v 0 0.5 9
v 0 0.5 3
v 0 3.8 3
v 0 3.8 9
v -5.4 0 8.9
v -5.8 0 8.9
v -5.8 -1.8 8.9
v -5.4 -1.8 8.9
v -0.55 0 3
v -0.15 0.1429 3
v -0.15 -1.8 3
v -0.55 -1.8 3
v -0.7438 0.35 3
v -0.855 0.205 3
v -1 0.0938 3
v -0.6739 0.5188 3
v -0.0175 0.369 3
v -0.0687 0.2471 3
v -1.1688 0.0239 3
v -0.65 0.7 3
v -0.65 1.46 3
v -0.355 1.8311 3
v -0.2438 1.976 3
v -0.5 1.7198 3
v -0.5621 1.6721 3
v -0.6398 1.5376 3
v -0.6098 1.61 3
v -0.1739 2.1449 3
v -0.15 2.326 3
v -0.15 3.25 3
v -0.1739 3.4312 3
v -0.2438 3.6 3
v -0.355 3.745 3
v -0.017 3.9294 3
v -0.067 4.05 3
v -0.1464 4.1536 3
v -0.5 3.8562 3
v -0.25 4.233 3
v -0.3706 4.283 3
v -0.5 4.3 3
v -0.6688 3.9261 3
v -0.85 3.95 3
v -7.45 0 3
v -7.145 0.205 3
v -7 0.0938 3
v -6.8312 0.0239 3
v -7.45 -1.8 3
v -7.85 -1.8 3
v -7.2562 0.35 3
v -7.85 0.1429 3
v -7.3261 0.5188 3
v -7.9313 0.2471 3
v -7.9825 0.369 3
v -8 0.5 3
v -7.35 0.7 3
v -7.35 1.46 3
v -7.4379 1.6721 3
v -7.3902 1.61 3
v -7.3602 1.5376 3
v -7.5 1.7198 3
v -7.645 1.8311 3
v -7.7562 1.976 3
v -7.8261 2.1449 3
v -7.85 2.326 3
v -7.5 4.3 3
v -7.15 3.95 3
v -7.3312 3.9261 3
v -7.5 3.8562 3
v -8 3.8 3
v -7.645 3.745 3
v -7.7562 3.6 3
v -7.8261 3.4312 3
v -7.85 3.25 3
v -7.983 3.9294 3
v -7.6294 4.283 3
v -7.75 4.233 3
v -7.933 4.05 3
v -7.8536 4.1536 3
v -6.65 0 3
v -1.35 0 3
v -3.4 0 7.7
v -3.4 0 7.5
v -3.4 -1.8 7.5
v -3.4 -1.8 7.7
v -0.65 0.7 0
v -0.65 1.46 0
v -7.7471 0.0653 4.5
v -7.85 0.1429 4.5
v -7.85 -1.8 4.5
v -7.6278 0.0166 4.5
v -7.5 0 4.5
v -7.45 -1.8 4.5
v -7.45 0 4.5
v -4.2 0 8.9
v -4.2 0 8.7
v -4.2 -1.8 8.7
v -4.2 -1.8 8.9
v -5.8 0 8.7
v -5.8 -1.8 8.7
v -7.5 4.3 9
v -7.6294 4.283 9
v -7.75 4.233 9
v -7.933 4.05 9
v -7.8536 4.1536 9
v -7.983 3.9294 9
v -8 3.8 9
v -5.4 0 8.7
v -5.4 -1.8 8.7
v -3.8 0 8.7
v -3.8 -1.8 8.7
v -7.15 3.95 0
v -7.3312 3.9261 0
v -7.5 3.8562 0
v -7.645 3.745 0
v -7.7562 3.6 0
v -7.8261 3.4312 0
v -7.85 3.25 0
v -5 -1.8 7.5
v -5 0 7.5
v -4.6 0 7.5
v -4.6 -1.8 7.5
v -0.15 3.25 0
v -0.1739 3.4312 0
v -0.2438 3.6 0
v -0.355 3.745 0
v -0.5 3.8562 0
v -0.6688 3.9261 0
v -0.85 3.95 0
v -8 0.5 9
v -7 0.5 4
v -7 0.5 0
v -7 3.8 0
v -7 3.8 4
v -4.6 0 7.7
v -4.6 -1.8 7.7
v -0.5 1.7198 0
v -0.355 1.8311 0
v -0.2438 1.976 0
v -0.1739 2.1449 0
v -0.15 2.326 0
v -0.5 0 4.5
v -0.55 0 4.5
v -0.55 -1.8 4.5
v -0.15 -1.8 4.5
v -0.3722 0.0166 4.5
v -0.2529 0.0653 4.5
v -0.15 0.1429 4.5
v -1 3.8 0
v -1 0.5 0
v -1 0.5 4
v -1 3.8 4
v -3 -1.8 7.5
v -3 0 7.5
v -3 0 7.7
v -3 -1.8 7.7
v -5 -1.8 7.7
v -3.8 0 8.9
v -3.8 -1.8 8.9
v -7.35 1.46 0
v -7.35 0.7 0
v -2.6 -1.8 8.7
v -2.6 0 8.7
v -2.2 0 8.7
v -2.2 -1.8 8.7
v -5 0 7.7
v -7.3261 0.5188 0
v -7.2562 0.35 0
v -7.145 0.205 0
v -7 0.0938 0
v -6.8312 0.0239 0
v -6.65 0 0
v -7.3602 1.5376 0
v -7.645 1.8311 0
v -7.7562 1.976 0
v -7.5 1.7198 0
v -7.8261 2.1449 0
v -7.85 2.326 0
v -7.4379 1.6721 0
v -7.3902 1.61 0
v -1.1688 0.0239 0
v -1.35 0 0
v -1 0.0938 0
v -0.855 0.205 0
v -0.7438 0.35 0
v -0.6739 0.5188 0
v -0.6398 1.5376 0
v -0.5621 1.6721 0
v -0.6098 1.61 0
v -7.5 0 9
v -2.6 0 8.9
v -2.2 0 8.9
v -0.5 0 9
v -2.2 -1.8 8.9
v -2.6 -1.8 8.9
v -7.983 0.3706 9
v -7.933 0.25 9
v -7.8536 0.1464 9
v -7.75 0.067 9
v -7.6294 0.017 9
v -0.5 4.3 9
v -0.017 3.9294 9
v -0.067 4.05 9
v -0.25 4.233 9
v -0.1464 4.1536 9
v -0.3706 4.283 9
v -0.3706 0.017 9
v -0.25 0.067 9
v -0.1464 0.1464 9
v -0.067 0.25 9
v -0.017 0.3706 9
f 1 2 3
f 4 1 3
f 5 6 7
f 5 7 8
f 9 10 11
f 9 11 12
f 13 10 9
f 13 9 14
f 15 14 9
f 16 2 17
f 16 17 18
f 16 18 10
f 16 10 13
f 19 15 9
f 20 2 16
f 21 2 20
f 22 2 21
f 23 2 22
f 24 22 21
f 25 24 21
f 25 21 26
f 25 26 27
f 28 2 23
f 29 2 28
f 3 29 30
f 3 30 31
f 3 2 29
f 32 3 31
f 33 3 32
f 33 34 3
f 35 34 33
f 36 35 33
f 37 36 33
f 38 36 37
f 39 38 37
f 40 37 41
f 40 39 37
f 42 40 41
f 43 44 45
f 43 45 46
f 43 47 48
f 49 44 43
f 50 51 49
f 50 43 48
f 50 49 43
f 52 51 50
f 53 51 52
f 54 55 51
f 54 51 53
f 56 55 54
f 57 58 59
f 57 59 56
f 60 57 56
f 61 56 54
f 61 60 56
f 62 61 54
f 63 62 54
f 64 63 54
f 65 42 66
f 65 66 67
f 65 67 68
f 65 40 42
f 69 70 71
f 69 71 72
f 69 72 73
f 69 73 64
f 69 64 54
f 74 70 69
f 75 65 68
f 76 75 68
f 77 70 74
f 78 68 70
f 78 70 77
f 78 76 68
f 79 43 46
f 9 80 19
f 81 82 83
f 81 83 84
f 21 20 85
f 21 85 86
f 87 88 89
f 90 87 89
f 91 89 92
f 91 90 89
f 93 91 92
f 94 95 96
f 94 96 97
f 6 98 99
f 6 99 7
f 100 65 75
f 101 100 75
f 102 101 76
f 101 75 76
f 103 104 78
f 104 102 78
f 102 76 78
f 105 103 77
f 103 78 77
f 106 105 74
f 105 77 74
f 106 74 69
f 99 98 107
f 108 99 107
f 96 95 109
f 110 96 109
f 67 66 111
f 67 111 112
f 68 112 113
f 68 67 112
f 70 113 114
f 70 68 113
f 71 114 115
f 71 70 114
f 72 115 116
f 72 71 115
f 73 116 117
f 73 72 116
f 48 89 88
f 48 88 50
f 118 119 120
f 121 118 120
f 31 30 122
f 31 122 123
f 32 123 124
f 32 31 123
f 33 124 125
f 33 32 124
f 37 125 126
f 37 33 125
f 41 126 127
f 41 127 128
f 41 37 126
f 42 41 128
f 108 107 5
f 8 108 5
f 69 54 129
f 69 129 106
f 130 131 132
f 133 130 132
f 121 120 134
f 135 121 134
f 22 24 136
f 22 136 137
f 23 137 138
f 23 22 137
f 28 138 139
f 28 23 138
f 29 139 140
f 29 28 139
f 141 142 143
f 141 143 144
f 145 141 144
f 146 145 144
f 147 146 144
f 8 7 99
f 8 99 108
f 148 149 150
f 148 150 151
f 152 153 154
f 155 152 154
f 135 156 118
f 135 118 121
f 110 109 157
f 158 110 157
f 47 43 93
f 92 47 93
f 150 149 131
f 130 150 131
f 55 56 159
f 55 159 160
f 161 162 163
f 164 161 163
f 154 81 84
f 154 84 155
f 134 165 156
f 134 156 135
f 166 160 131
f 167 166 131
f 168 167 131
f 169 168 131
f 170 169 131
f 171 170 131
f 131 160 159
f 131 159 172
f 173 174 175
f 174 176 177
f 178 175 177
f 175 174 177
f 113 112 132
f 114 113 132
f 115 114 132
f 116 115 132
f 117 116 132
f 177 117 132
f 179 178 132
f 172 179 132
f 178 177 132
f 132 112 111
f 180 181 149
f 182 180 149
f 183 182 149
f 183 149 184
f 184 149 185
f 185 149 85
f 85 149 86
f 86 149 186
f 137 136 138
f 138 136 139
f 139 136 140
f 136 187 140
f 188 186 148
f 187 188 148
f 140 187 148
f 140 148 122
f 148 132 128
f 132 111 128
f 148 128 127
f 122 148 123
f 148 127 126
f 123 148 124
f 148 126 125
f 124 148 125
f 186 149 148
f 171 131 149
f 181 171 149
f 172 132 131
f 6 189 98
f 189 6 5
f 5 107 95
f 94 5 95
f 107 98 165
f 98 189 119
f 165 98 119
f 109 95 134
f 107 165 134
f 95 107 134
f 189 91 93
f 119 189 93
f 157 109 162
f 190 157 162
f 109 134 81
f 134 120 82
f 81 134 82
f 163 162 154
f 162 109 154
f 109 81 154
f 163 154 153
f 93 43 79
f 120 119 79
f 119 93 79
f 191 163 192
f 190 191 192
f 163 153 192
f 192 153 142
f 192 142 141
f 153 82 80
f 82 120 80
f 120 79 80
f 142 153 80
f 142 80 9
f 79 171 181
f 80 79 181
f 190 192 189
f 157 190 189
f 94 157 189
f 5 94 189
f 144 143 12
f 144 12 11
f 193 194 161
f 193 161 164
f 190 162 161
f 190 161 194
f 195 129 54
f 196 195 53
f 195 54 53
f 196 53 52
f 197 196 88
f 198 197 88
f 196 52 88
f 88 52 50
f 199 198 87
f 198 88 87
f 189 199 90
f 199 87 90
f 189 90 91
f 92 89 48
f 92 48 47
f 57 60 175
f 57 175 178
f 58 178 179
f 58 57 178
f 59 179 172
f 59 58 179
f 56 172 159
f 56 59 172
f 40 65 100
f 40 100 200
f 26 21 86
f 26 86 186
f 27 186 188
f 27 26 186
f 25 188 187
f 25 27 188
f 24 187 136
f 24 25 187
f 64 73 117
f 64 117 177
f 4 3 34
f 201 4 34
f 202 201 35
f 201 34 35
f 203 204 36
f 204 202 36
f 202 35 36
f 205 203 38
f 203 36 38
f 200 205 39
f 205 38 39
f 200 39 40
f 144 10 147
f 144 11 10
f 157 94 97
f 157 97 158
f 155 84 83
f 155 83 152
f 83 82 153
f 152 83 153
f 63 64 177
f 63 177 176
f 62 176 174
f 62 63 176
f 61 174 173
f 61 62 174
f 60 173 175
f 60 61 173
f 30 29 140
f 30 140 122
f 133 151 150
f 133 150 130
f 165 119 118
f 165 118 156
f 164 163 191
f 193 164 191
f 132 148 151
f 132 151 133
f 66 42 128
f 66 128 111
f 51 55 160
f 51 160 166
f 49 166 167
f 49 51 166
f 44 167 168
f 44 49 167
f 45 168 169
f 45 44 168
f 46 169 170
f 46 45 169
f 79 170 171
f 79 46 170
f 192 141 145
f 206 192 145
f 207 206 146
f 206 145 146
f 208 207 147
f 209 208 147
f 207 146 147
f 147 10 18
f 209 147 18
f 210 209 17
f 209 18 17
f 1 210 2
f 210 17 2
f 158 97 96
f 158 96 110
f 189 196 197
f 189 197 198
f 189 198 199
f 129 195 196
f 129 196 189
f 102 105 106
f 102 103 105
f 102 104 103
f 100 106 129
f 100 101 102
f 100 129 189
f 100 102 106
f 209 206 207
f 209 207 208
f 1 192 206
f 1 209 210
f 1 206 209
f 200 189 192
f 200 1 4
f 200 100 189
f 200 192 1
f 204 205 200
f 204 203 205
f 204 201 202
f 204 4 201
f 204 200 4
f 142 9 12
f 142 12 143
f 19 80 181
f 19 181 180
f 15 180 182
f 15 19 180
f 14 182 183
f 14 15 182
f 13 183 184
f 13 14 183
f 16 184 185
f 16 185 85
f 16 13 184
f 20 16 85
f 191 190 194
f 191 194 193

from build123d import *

# Parameters (mm, degrees)
ESQUISSE1_W             = 8
ESQUISSE1_H             = 4.3
EXTRUSION1_DEPTH        = 9
ESQUISSE2_W             = 6
ESQUISSE2_H             = 3.3
ENL_V_MAT_EXTRU_1_DEPTH = 4
ESQUISSE3_W             = 0.4
ESQUISSE3_H             = 1.5
EXTRUSION2_DEPTH        = 1.8
CONG_1_R                = 0.5
ESQUISSE4_W             = 0.4
ESQUISSE4_H             = 0.2
EXTRUSION3_DEPTH        = 1.8
ENL_V_START             = -3
ENL_V_MAT_EXTRU_3_DEPTH = 3


# Read off the part's stored shape, not the designer's step: Enlèv. mat.-Extru.3
with BuildPart() as part:
    # Esquisse1 → Extrusion1 (new body)
    with BuildSketch(Plane.XY):
        with Locations((-4, 2.15)):
            Rectangle(ESQUISSE1_W, ESQUISSE1_H)
    extrude(amount=EXTRUSION1_DEPTH)

    # Esquisse2 → Enlèv. mat.-Extru.1 (cut)
    with BuildSketch(Plane(origin=(0, 0, 0), x_dir=(-1, 0, 0), z_dir=(0, 0, -1))):
        with Locations((4, 2.15)):
            Rectangle(ESQUISSE2_W, ESQUISSE2_H)
    extrude(amount=-ENL_V_MAT_EXTRU_1_DEPTH, mode=Mode.SUBTRACT)

    # Esquisse3 → Extrusion2 (add)
    with BuildSketch(Plane.XZ):
        with Locations((-0.35, 3.75)):
            Rectangle(ESQUISSE3_W, ESQUISSE3_H)
        with Locations((-7.65, 3.75)):
            Rectangle(ESQUISSE3_W, ESQUISSE3_H)
    extrude(amount=EXTRUSION2_DEPTH)

    # Congé1
    # the kernel refuses this fillet: 0.5 mm, written as the material it takes off along each edge
    with BuildSketch(Plane(origin=(0, 0, -1.25), x_dir=(-1, 0, 0), z_dir=(0, 0, 1))) as cong_1_piece_1_section:
        with BuildLine():
            CenterArc((CONG_1_R, -CONG_1_R), CONG_1_R, 90, 90)
            Line((0, -CONG_1_R), (0, 0))
            Line((0, 0), (CONG_1_R, 0))
        make_face()
    cong_1_piece_1 = extrude(amount=11.5, mode=Mode.PRIVATE)
    cong_1_piece_1 = split(cong_1_piece_1, bisect_by=Plane(origin=(-0.251340373, 0.033035409, 3), z_dir=(0, 0, -1)), keep=Keep.TOP, mode=Mode.PRIVATE)
    cong_1_piece_1 = split(cong_1_piece_1, bisect_by=Plane(origin=(-0.15, 0.033035409, 0.875), z_dir=(-1, 0, 0)), keep=Keep.TOP, mode=Mode.PRIVATE)
    add(cong_1_piece_1, mode=Mode.SUBTRACT)
    with BuildSketch(Plane(origin=(0, 0, -1.25), x_dir=(-1, 0, 0), z_dir=(0, 0, 1))) as cong_1_piece_2_section:
        with BuildLine():
            CenterArc((CONG_1_R, -CONG_1_R), CONG_1_R, 90, 90)
            Line((0, -CONG_1_R), (0, 0))
            Line((0, 0), (CONG_1_R, 0))
        make_face()
    cong_1_piece_2 = extrude(amount=11.5, mode=Mode.PRIVATE)
    cong_1_piece_2 = split(cong_1_piece_2, bisect_by=Plane(origin=(-0.054158411, 0.147457064, 3), z_dir=(0, 0, -1)), keep=Keep.TOP, mode=Mode.PRIVATE)
    cong_1_piece_2 = split(cong_1_piece_2, bisect_by=Plane(origin=(-0.15, 0.147457064, 0.875), z_dir=(1, 0, 0)), keep=Keep.TOP, mode=Mode.PRIVATE)
    add(cong_1_piece_2, mode=Mode.SUBTRACT)
    with BuildSketch(Plane(origin=(0, 0, -1.25), x_dir=(-1, 0, 0), z_dir=(0, 0, 1))) as cong_1_piece_3_section:
        with BuildLine():
            CenterArc((CONG_1_R, -CONG_1_R), CONG_1_R, 90, 90)
            Line((0, -CONG_1_R), (0, 0))
            Line((0, 0), (CONG_1_R, 0))
        make_face()
    cong_1_piece_3 = extrude(amount=11.5, mode=Mode.PRIVATE)
    cong_1_piece_3 = split(cong_1_piece_3, bisect_by=Plane(origin=(-0.054158411, 0.147457064, 3), z_dir=(0, 0, 1)), keep=Keep.TOP, mode=Mode.PRIVATE)
    cong_1_piece_3 = split(cong_1_piece_3, bisect_by=Plane(origin=(-0.15, 0.147457064, 3.75), z_dir=(1, 0, 0)), keep=Keep.TOP, mode=Mode.PRIVATE)
    cong_1_piece_3 = split(cong_1_piece_3, bisect_by=Plane(origin=(-0.054158411, 0.147457064, 4.5), z_dir=(0, 0, -1)), keep=Keep.TOP, mode=Mode.PRIVATE)
    add(cong_1_piece_3, mode=Mode.SUBTRACT)
    with BuildSketch(Plane(origin=(0, 0, -1.25), x_dir=(-1, 0, 0), z_dir=(0, 0, 1))) as cong_1_piece_4_section:
        with BuildLine():
            CenterArc((CONG_1_R, -CONG_1_R), CONG_1_R, 90, 90)
            Line((0, -CONG_1_R), (0, 0))
            Line((0, 0), (CONG_1_R, 0))
        make_face()
    cong_1_piece_4 = extrude(amount=11.5, mode=Mode.PRIVATE)
    cong_1_piece_4 = split(cong_1_piece_4, bisect_by=Plane(origin=(-0.15, 0.033035409, 7.375), z_dir=(-1, 0, 0)), keep=Keep.TOP, mode=Mode.PRIVATE)
    cong_1_piece_4 = split(cong_1_piece_4, bisect_by=Plane(origin=(-0.251340373, 0.033035409, 4.5), z_dir=(0, 0, 1)), keep=Keep.TOP, mode=Mode.PRIVATE)
    add(cong_1_piece_4, mode=Mode.SUBTRACT)
    with BuildSketch(Plane(origin=(0, 0, -1.25), x_dir=(-1, 0, 0), z_dir=(0, 0, 1))) as cong_1_piece_5_section:
        with BuildLine():
            CenterArc((CONG_1_R, -CONG_1_R), CONG_1_R, 90, 90)
            Line((0, -CONG_1_R), (0, 0))
            Line((0, 0), (CONG_1_R, 0))
        make_face()
    cong_1_piece_5 = extrude(amount=11.5, mode=Mode.PRIVATE)
    cong_1_piece_5 = split(cong_1_piece_5, bisect_by=Plane(origin=(-0.15, 0.147457064, 7.375), z_dir=(1, 0, 0)), keep=Keep.TOP, mode=Mode.PRIVATE)
    cong_1_piece_5 = split(cong_1_piece_5, bisect_by=Plane(origin=(-0.054158411, 0.147457064, 4.5), z_dir=(0, 0, 1)), keep=Keep.TOP, mode=Mode.PRIVATE)
    add(cong_1_piece_5, mode=Mode.SUBTRACT)
    with BuildSketch(Plane(origin=(-8, 0, -1.25), x_dir=(1, 0, 0), z_dir=(0, 0, 1))) as cong_1_piece_6_section:
        with BuildLine():
            CenterArc((CONG_1_R, CONG_1_R), CONG_1_R, 180, 90)
            Line((0, CONG_1_R), (0, 0))
            Line((0, 0), (CONG_1_R, 0))
        make_face()
    cong_1_piece_6 = extrude(amount=11.5, mode=Mode.PRIVATE)
    cong_1_piece_6 = split(cong_1_piece_6, bisect_by=Plane(origin=(-7.85, 0.033035409, 0.875), z_dir=(1, 0, 0)), keep=Keep.TOP, mode=Mode.PRIVATE)
    cong_1_piece_6 = split(cong_1_piece_6, bisect_by=Plane(origin=(-7.748659627, 0.033035409, 3), z_dir=(0, 0, -1)), keep=Keep.TOP, mode=Mode.PRIVATE)
    add(cong_1_piece_6, mode=Mode.SUBTRACT)
    with BuildSketch(Plane(origin=(-8, 0, -1.25), x_dir=(1, 0, 0), z_dir=(0, 0, 1))) as cong_1_piece_7_section:
        with BuildLine():
            CenterArc((CONG_1_R, CONG_1_R), CONG_1_R, 180, 90)
            Line((0, CONG_1_R), (0, 0))
            Line((0, 0), (CONG_1_R, 0))
        make_face()
    cong_1_piece_7 = extrude(amount=11.5, mode=Mode.PRIVATE)
    cong_1_piece_7 = split(cong_1_piece_7, bisect_by=Plane(origin=(-7.85, 0.147457064, 0.875), z_dir=(-1, 0, 0)), keep=Keep.TOP, mode=Mode.PRIVATE)
    cong_1_piece_7 = split(cong_1_piece_7, bisect_by=Plane(origin=(-7.945841589, 0.147457064, 3), z_dir=(0, 0, -1)), keep=Keep.TOP, mode=Mode.PRIVATE)
    add(cong_1_piece_7, mode=Mode.SUBTRACT)
    with BuildSketch(Plane(origin=(-8, 0, -1.25), x_dir=(1, 0, 0), z_dir=(0, 0, 1))) as cong_1_piece_8_section:
        with BuildLine():
            CenterArc((CONG_1_R, CONG_1_R), CONG_1_R, 180, 90)
            Line((0, CONG_1_R), (0, 0))
            Line((0, 0), (CONG_1_R, 0))
        make_face()
    cong_1_piece_8 = extrude(amount=11.5, mode=Mode.PRIVATE)
    cong_1_piece_8 = split(cong_1_piece_8, bisect_by=Plane(origin=(-7.945841589, 0.147457064, 4.5), z_dir=(0, 0, -1)), keep=Keep.TOP, mode=Mode.PRIVATE)
    cong_1_piece_8 = split(cong_1_piece_8, bisect_by=Plane(origin=(-7.85, 0.147457064, 3.75), z_dir=(-1, 0, 0)), keep=Keep.TOP, mode=Mode.PRIVATE)
    cong_1_piece_8 = split(cong_1_piece_8, bisect_by=Plane(origin=(-7.945841589, 0.147457064, 3), z_dir=(0, 0, 1)), keep=Keep.TOP, mode=Mode.PRIVATE)
    add(cong_1_piece_8, mode=Mode.SUBTRACT)
    with BuildSketch(Plane(origin=(-8, 0, -1.25), x_dir=(1, 0, 0), z_dir=(0, 0, 1))) as cong_1_piece_9_section:
        with BuildLine():
            CenterArc((CONG_1_R, CONG_1_R), CONG_1_R, 180, 90)
            Line((0, CONG_1_R), (0, 0))
            Line((0, 0), (CONG_1_R, 0))
        make_face()
    cong_1_piece_9 = extrude(amount=11.5, mode=Mode.PRIVATE)
    cong_1_piece_9 = split(cong_1_piece_9, bisect_by=Plane(origin=(-7.748659627, 0.033035409, 4.5), z_dir=(0, 0, 1)), keep=Keep.TOP, mode=Mode.PRIVATE)
    cong_1_piece_9 = split(cong_1_piece_9, bisect_by=Plane(origin=(-7.85, 0.033035409, 7.375), z_dir=(1, 0, 0)), keep=Keep.TOP, mode=Mode.PRIVATE)
    add(cong_1_piece_9, mode=Mode.SUBTRACT)
    with BuildSketch(Plane(origin=(-8, 0, -1.25), x_dir=(1, 0, 0), z_dir=(0, 0, 1))) as cong_1_piece_10_section:
        with BuildLine():
            CenterArc((CONG_1_R, CONG_1_R), CONG_1_R, 180, 90)
            Line((0, CONG_1_R), (0, 0))
            Line((0, 0), (CONG_1_R, 0))
        make_face()
    cong_1_piece_10 = extrude(amount=11.5, mode=Mode.PRIVATE)
    cong_1_piece_10 = split(cong_1_piece_10, bisect_by=Plane(origin=(-7.945841589, 0.147457064, 4.5), z_dir=(0, 0, 1)), keep=Keep.TOP, mode=Mode.PRIVATE)
    cong_1_piece_10 = split(cong_1_piece_10, bisect_by=Plane(origin=(-7.85, 0.147457064, 7.375), z_dir=(-1, 0, 0)), keep=Keep.TOP, mode=Mode.PRIVATE)
    add(cong_1_piece_10, mode=Mode.SUBTRACT)
    with BuildSketch(Plane(origin=(-8, 4.3, -1.25), x_dir=(0, -1, 0), z_dir=(0, 0, 1))) as cong_1_piece_11:
        with BuildLine():
            CenterArc((CONG_1_R, CONG_1_R), CONG_1_R, 180, 90)
            Line((0, CONG_1_R), (0, 0))
            Line((0, 0), (CONG_1_R, 0))
        make_face()
    extrude(amount=11.5, mode=Mode.SUBTRACT)
    with BuildSketch(Plane(origin=(0, 4.3, -1.25), x_dir=(0, -1, 0), z_dir=(0, 0, 1))) as cong_1_piece_12:
        with BuildLine():
            CenterArc((CONG_1_R, -CONG_1_R), CONG_1_R, 90, 90)
            Line((0, -CONG_1_R), (0, 0))
            Line((0, 0), (CONG_1_R, 0))
        make_face()
    extrude(amount=11.5, mode=Mode.SUBTRACT)

    # Esquisse4 → Extrusion3 (add)
    with BuildSketch(Plane.XZ):
        with Locations((-2.4, 8.8)):
            Rectangle(ESQUISSE4_W, ESQUISSE4_H)
        with Locations((-5.6, 8.8)):
            Rectangle(ESQUISSE4_W, ESQUISSE4_H)
        with Locations((-4, 8.8)):
            Rectangle(ESQUISSE4_W, ESQUISSE4_H)
        with Locations((-3.2, 7.6)):
            Rectangle(ESQUISSE4_W, ESQUISSE4_H)
        with Locations((-4.8, 7.6)):
            Rectangle(ESQUISSE4_W, ESQUISSE4_H)
    extrude(amount=EXTRUSION3_DEPTH)

    # Enlèv. mat.-Extru.3 outline → Enlèv. mat.-Extru.3 (cut)
    with BuildSketch(Plane(origin=(0, 0, 0), x_dir=(-1, 0, 0), z_dir=(0, 0, -1)).offset(ENL_V_START)):
        with BuildLine():
            Line((0.15, 2.326025404), (0.15, 3.25))
            ThreePointArc((0.15, 3.25), (0.355025253, 3.744974747), (0.85, 3.95))
            Line((0.85, 3.95), (7.15, 3.95))
            ThreePointArc((7.15, 3.95), (7.644974747, 3.744974747), (7.85, 3.25))
            Line((7.85, 3.25), (7.85, 2.326025404))
            ThreePointArc((7.85, 2.326025404), (7.756217783, 1.976025404), (7.5, 1.719807621))
            ThreePointArc((7.5, 1.719807621), (7.390192379, 1.61), (7.35, 1.46))
            Line((7.35, 1.46), (7.35, 0.7))
            ThreePointArc((7.35, 0.7), (7.144974747, 0.205025253), (6.65, 0))
            Line((6.65, 0), (7.5, 0))
            ThreePointArc((7.5, 0), (7.853553391, 0.146446609), (8, 0.5))
            Line((8, 0.5), (8, 3.8))
            ThreePointArc((8, 3.8), (7.853553391, 4.153553391), (7.5, 4.3))
            Line((7.5, 4.3), (0.5, 4.3))
            ThreePointArc((0.5, 4.3), (0.146446609, 4.153553391), (0, 3.8))
            Line((0, 3.8), (0, 0.5))
            ThreePointArc((0, 0.5), (0.146446609, 0.146446609), (0.5, 0))
            Line((0.5, 0), (1.35, 0))
            ThreePointArc((1.35, 0), (0.855025253, 0.205025253), (0.65, 0.7))
            Line((0.65, 0.7), (0.65, 1.46))
            ThreePointArc((0.65, 1.46), (0.609807621, 1.61), (0.5, 1.719807621))
            ThreePointArc((0.5, 1.719807621), (0.243782217, 1.976025404), (0.15, 2.326025404))
        make_face()
    extrude(amount=ENL_V_MAT_EXTRU_3_DEPTH, mode=Mode.SUBTRACT)


solid = part.part
